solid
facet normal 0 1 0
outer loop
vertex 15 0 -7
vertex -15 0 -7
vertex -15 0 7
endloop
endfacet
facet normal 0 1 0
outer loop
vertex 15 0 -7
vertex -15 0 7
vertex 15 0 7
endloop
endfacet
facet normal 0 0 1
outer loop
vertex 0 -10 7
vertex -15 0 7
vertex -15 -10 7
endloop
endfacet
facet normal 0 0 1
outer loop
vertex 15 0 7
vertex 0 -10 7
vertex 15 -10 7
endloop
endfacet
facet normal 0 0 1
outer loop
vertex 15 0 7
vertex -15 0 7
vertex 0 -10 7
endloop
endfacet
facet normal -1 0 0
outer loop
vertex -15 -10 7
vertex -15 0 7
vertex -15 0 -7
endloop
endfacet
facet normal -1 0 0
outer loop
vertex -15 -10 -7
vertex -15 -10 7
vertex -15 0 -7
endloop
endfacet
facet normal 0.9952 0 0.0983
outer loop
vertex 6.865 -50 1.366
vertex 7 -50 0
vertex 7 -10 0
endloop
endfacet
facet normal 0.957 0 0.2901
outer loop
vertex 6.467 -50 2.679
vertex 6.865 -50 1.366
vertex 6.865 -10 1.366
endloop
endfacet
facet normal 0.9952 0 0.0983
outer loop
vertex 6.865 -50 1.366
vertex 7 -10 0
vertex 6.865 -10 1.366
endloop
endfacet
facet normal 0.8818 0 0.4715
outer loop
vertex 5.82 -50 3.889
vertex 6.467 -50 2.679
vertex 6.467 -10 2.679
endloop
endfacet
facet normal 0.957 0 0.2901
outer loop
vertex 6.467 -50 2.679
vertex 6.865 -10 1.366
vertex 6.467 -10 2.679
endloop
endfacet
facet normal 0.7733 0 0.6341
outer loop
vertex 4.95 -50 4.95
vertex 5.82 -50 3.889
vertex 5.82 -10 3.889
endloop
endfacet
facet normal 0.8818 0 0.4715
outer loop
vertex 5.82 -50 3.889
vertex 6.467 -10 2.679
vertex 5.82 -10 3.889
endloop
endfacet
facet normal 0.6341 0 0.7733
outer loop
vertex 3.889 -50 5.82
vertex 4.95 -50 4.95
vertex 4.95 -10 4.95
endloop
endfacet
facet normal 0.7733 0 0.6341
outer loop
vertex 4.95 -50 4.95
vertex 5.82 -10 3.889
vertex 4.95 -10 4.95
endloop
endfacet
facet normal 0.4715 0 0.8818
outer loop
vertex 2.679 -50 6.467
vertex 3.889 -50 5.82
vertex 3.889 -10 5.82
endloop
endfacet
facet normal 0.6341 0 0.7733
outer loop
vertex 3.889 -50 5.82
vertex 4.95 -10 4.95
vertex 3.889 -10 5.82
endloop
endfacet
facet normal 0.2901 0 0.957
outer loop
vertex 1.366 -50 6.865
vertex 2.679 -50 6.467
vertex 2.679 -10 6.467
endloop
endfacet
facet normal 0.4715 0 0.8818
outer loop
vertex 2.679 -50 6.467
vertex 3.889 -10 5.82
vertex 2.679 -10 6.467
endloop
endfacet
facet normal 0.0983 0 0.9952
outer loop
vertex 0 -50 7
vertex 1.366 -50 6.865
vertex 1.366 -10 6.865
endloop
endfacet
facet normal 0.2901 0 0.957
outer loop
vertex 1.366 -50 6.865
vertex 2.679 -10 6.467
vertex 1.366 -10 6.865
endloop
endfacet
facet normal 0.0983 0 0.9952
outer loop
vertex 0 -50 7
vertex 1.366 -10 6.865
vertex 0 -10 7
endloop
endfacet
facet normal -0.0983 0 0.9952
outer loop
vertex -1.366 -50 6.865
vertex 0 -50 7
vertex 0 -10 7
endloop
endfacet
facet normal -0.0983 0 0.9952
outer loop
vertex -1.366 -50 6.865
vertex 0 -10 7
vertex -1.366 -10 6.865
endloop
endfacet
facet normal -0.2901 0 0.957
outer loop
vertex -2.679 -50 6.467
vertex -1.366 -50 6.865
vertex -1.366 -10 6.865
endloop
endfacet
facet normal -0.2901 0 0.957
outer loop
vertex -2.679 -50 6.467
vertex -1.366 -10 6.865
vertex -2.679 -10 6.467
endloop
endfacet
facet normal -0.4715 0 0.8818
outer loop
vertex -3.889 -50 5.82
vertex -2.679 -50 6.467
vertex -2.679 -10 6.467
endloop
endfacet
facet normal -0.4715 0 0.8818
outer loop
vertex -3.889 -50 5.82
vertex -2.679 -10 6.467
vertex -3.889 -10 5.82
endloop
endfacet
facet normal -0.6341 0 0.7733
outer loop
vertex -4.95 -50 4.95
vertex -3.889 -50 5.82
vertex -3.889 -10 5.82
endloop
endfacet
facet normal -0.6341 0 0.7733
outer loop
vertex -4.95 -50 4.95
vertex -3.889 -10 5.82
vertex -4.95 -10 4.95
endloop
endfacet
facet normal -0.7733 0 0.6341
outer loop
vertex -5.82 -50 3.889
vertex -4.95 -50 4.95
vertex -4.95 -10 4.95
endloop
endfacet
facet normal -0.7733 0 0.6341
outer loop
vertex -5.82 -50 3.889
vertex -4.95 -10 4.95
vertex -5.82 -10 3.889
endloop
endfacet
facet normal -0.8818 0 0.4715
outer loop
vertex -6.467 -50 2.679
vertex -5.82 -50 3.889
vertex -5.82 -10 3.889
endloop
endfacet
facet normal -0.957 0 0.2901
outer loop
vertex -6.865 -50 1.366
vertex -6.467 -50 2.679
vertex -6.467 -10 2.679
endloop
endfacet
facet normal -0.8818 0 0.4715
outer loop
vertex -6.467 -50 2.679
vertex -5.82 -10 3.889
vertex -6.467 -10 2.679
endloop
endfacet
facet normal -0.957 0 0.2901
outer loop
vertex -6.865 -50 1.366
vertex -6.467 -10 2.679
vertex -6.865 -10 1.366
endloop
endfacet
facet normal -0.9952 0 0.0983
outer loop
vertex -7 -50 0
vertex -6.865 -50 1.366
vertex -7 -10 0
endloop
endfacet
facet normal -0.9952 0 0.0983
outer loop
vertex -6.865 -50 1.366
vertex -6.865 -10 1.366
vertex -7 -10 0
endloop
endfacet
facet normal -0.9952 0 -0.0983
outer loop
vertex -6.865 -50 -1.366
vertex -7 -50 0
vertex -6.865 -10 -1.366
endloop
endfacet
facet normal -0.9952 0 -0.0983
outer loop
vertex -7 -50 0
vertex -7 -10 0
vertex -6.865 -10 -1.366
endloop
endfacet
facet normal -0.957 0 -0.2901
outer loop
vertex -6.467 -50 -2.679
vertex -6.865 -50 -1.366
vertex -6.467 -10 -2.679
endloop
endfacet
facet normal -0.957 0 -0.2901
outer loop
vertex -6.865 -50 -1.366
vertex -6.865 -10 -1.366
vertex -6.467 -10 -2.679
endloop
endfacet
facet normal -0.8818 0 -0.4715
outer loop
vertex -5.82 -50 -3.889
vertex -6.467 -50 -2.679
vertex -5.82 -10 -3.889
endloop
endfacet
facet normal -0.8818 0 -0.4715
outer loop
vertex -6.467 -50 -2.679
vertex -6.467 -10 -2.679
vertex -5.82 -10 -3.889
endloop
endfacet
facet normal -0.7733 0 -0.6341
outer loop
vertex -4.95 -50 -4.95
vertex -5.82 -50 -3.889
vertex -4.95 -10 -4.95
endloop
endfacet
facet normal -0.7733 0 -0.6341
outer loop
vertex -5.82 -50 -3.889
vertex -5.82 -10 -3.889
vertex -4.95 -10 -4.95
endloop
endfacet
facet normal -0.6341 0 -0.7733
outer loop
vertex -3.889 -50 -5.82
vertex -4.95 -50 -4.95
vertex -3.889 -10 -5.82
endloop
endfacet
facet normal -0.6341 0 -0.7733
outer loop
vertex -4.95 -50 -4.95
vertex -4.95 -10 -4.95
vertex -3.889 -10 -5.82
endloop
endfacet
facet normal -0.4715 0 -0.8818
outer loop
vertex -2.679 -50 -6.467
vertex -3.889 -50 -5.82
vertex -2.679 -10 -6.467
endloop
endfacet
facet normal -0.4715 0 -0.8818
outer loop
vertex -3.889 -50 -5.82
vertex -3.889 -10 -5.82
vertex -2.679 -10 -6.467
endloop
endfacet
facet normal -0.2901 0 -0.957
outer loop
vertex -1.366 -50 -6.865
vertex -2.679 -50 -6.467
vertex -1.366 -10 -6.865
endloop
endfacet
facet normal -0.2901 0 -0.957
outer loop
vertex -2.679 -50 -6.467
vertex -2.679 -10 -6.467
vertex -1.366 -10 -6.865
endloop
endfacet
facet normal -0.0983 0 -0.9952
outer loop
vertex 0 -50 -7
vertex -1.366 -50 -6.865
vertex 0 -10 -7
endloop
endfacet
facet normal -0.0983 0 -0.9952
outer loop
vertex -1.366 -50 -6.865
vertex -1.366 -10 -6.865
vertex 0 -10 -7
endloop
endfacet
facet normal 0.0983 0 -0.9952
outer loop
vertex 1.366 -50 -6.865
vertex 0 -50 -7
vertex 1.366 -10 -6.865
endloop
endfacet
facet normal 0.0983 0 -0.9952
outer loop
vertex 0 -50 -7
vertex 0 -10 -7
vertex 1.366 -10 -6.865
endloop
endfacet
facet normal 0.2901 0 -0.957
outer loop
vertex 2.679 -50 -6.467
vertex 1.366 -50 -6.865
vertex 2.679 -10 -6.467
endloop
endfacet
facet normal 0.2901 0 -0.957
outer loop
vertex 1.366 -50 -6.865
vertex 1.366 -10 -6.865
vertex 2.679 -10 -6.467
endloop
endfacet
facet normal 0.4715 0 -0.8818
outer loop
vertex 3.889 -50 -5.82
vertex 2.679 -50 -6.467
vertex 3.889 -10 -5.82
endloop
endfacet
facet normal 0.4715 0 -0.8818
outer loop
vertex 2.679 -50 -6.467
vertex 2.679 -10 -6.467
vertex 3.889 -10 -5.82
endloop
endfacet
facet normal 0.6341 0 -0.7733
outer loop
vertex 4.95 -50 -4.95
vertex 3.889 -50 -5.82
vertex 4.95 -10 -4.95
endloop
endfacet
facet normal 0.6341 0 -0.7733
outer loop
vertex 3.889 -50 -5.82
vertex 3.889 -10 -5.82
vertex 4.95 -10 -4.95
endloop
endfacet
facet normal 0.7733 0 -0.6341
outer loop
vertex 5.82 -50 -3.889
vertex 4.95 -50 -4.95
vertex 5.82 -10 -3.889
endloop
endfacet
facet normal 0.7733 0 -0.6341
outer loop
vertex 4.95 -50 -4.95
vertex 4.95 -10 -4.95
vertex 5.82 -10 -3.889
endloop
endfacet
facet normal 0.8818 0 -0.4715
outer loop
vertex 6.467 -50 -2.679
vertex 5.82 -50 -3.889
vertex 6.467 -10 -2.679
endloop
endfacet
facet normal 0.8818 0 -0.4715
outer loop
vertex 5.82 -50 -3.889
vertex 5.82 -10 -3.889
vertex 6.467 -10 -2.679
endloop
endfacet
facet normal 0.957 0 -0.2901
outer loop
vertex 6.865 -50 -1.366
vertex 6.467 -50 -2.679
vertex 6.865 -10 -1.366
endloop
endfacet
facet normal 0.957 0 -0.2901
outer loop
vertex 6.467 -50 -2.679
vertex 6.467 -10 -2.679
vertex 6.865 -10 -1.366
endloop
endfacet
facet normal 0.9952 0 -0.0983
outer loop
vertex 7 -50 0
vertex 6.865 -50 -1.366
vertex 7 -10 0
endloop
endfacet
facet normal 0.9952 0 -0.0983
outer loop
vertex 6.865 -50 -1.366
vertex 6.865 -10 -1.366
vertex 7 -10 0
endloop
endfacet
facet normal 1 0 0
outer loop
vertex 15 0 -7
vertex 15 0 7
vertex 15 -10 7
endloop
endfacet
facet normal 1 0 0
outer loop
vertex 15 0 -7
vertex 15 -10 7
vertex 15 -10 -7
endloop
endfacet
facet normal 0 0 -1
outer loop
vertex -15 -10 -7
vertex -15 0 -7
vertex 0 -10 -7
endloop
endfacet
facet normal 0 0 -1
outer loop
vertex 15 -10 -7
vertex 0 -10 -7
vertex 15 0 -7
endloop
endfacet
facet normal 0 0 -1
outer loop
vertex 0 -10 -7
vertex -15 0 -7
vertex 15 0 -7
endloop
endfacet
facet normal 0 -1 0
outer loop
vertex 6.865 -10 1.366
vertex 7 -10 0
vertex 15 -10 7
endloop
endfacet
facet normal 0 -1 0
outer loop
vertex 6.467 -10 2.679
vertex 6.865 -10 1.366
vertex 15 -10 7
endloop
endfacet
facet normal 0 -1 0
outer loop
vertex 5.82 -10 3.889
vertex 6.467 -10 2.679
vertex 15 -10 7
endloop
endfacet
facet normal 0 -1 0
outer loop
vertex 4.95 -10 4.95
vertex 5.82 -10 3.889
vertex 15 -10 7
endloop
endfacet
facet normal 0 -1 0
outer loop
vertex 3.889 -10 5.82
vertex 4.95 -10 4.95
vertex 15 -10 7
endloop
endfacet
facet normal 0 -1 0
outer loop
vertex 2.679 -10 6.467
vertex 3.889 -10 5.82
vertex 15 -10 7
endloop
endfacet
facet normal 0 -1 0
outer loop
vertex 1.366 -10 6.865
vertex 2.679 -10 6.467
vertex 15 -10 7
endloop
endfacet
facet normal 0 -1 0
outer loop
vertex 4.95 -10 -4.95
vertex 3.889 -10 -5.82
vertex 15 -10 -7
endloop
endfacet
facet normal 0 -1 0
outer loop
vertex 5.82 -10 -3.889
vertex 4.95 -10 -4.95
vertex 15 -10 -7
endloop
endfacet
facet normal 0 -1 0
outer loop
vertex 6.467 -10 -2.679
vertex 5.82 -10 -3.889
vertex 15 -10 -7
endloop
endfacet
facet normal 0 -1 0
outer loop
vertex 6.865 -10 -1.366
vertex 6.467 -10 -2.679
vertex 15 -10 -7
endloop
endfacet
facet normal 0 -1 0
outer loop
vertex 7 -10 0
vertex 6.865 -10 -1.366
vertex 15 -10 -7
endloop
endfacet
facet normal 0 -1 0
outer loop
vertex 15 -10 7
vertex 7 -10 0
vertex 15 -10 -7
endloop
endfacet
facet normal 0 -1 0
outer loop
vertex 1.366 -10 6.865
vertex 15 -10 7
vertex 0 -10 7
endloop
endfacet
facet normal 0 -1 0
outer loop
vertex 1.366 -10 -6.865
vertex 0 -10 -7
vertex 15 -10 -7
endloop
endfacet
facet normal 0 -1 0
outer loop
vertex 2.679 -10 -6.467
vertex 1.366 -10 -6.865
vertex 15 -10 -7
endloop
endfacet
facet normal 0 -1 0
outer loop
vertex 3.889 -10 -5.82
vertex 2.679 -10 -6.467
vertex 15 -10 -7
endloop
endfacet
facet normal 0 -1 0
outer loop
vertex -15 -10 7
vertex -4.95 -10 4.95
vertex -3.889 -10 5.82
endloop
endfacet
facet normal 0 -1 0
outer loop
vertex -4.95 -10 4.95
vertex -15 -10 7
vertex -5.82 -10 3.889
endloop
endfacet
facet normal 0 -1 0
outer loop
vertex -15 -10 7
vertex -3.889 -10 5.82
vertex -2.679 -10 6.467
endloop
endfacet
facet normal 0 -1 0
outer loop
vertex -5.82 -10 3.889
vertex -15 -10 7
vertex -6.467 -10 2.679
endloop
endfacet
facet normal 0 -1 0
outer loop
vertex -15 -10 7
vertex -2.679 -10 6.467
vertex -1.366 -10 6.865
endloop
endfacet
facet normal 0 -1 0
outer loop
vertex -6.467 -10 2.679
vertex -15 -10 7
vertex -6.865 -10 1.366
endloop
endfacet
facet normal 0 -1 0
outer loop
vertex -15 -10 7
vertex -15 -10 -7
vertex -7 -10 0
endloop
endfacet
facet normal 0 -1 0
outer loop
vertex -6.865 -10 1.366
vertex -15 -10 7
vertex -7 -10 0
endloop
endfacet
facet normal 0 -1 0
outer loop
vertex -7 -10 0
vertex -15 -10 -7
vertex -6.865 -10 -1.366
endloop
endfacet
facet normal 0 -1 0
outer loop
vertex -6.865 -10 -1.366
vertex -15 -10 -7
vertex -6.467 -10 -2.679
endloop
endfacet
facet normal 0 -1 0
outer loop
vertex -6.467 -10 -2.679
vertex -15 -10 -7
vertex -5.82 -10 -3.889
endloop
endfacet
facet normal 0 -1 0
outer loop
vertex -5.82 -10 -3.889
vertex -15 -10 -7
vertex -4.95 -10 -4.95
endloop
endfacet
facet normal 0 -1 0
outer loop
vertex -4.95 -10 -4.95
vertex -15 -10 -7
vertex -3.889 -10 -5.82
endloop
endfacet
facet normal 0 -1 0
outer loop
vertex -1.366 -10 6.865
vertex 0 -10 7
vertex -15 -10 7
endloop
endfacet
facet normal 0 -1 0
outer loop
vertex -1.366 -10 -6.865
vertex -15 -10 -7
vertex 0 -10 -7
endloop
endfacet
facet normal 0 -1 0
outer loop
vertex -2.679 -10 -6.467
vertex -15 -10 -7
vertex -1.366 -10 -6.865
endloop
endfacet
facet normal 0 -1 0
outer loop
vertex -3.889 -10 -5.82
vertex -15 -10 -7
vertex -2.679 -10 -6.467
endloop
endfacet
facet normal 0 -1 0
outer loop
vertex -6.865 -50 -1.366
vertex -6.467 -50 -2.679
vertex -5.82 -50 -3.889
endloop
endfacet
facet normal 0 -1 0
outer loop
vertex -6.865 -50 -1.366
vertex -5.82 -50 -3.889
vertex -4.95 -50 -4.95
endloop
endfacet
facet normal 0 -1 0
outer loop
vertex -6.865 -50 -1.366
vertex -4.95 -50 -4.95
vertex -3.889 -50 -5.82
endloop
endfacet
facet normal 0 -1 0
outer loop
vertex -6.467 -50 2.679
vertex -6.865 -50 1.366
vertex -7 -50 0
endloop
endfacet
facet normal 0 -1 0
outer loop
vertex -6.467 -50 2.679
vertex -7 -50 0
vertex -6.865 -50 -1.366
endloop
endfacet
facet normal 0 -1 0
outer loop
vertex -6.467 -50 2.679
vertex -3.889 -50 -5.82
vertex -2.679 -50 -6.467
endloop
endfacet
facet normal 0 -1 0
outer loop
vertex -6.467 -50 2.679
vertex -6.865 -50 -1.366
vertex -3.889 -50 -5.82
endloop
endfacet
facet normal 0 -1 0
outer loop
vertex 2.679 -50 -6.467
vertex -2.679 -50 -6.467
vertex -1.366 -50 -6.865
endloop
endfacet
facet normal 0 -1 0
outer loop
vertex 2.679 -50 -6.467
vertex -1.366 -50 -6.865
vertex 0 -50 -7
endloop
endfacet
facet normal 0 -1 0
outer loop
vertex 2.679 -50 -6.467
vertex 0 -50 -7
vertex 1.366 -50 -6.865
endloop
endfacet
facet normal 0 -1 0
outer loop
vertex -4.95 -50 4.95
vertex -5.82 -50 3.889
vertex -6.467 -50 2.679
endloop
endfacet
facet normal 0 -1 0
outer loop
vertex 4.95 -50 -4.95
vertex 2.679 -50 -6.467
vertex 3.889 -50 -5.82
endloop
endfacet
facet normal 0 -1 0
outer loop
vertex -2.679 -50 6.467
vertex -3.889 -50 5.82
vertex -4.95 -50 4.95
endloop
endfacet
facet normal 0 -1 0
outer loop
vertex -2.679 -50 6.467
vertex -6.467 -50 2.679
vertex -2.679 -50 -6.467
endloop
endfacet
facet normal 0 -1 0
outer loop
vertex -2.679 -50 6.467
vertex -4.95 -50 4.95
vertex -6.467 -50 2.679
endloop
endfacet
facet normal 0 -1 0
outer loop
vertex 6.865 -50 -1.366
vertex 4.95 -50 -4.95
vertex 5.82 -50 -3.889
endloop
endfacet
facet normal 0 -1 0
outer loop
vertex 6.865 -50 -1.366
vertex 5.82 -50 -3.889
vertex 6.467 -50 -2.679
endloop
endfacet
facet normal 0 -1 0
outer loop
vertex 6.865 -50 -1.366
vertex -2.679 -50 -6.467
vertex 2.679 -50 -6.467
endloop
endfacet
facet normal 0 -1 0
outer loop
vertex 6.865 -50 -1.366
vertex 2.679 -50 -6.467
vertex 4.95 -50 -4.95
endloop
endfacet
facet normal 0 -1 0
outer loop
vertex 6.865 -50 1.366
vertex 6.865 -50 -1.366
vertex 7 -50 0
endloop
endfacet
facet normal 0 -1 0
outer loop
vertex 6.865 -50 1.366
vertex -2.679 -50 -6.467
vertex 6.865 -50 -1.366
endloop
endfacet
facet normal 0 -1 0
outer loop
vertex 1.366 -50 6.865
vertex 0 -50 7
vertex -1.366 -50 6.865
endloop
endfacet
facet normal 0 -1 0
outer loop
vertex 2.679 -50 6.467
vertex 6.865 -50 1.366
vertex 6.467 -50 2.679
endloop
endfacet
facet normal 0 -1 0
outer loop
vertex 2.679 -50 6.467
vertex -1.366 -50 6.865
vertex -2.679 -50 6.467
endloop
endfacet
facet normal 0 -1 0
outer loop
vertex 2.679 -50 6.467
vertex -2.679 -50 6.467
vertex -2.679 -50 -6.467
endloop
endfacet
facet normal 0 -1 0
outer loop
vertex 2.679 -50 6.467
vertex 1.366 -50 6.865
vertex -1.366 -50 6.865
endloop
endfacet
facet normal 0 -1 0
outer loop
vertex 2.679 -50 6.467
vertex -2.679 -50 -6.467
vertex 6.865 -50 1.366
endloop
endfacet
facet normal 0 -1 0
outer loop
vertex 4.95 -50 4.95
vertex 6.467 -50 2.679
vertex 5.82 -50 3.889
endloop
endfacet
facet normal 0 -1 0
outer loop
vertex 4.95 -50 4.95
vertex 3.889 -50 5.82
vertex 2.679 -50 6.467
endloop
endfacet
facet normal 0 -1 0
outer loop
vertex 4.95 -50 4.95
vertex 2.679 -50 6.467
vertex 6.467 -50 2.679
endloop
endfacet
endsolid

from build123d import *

# Parameters (mm, degrees)
SKETCH2_W           = 30
SKETCH2_H           = 14
BOSS_EXTRUDE1_DEPTH = 10
SKETCH3_R           = 7
BOSS_EXTRUDE2_DEPTH = 40


with BuildPart() as part:
    # Sketch2 → Boss-Extrude1 (new body)
    with BuildSketch(Plane(origin=(0, 0, 0), x_dir=(1, 0, 0), z_dir=(0, 1, 0))):
        Rectangle(SKETCH2_W, SKETCH2_H)
    extrude(amount=-BOSS_EXTRUDE1_DEPTH)

    # Sketch3 → Boss-Extrude2 (add)
    with BuildSketch(Plane.XZ.offset(10)):
        Circle(SKETCH3_R)
    extrude(amount=BOSS_EXTRUDE2_DEPTH)


solid = part.part
